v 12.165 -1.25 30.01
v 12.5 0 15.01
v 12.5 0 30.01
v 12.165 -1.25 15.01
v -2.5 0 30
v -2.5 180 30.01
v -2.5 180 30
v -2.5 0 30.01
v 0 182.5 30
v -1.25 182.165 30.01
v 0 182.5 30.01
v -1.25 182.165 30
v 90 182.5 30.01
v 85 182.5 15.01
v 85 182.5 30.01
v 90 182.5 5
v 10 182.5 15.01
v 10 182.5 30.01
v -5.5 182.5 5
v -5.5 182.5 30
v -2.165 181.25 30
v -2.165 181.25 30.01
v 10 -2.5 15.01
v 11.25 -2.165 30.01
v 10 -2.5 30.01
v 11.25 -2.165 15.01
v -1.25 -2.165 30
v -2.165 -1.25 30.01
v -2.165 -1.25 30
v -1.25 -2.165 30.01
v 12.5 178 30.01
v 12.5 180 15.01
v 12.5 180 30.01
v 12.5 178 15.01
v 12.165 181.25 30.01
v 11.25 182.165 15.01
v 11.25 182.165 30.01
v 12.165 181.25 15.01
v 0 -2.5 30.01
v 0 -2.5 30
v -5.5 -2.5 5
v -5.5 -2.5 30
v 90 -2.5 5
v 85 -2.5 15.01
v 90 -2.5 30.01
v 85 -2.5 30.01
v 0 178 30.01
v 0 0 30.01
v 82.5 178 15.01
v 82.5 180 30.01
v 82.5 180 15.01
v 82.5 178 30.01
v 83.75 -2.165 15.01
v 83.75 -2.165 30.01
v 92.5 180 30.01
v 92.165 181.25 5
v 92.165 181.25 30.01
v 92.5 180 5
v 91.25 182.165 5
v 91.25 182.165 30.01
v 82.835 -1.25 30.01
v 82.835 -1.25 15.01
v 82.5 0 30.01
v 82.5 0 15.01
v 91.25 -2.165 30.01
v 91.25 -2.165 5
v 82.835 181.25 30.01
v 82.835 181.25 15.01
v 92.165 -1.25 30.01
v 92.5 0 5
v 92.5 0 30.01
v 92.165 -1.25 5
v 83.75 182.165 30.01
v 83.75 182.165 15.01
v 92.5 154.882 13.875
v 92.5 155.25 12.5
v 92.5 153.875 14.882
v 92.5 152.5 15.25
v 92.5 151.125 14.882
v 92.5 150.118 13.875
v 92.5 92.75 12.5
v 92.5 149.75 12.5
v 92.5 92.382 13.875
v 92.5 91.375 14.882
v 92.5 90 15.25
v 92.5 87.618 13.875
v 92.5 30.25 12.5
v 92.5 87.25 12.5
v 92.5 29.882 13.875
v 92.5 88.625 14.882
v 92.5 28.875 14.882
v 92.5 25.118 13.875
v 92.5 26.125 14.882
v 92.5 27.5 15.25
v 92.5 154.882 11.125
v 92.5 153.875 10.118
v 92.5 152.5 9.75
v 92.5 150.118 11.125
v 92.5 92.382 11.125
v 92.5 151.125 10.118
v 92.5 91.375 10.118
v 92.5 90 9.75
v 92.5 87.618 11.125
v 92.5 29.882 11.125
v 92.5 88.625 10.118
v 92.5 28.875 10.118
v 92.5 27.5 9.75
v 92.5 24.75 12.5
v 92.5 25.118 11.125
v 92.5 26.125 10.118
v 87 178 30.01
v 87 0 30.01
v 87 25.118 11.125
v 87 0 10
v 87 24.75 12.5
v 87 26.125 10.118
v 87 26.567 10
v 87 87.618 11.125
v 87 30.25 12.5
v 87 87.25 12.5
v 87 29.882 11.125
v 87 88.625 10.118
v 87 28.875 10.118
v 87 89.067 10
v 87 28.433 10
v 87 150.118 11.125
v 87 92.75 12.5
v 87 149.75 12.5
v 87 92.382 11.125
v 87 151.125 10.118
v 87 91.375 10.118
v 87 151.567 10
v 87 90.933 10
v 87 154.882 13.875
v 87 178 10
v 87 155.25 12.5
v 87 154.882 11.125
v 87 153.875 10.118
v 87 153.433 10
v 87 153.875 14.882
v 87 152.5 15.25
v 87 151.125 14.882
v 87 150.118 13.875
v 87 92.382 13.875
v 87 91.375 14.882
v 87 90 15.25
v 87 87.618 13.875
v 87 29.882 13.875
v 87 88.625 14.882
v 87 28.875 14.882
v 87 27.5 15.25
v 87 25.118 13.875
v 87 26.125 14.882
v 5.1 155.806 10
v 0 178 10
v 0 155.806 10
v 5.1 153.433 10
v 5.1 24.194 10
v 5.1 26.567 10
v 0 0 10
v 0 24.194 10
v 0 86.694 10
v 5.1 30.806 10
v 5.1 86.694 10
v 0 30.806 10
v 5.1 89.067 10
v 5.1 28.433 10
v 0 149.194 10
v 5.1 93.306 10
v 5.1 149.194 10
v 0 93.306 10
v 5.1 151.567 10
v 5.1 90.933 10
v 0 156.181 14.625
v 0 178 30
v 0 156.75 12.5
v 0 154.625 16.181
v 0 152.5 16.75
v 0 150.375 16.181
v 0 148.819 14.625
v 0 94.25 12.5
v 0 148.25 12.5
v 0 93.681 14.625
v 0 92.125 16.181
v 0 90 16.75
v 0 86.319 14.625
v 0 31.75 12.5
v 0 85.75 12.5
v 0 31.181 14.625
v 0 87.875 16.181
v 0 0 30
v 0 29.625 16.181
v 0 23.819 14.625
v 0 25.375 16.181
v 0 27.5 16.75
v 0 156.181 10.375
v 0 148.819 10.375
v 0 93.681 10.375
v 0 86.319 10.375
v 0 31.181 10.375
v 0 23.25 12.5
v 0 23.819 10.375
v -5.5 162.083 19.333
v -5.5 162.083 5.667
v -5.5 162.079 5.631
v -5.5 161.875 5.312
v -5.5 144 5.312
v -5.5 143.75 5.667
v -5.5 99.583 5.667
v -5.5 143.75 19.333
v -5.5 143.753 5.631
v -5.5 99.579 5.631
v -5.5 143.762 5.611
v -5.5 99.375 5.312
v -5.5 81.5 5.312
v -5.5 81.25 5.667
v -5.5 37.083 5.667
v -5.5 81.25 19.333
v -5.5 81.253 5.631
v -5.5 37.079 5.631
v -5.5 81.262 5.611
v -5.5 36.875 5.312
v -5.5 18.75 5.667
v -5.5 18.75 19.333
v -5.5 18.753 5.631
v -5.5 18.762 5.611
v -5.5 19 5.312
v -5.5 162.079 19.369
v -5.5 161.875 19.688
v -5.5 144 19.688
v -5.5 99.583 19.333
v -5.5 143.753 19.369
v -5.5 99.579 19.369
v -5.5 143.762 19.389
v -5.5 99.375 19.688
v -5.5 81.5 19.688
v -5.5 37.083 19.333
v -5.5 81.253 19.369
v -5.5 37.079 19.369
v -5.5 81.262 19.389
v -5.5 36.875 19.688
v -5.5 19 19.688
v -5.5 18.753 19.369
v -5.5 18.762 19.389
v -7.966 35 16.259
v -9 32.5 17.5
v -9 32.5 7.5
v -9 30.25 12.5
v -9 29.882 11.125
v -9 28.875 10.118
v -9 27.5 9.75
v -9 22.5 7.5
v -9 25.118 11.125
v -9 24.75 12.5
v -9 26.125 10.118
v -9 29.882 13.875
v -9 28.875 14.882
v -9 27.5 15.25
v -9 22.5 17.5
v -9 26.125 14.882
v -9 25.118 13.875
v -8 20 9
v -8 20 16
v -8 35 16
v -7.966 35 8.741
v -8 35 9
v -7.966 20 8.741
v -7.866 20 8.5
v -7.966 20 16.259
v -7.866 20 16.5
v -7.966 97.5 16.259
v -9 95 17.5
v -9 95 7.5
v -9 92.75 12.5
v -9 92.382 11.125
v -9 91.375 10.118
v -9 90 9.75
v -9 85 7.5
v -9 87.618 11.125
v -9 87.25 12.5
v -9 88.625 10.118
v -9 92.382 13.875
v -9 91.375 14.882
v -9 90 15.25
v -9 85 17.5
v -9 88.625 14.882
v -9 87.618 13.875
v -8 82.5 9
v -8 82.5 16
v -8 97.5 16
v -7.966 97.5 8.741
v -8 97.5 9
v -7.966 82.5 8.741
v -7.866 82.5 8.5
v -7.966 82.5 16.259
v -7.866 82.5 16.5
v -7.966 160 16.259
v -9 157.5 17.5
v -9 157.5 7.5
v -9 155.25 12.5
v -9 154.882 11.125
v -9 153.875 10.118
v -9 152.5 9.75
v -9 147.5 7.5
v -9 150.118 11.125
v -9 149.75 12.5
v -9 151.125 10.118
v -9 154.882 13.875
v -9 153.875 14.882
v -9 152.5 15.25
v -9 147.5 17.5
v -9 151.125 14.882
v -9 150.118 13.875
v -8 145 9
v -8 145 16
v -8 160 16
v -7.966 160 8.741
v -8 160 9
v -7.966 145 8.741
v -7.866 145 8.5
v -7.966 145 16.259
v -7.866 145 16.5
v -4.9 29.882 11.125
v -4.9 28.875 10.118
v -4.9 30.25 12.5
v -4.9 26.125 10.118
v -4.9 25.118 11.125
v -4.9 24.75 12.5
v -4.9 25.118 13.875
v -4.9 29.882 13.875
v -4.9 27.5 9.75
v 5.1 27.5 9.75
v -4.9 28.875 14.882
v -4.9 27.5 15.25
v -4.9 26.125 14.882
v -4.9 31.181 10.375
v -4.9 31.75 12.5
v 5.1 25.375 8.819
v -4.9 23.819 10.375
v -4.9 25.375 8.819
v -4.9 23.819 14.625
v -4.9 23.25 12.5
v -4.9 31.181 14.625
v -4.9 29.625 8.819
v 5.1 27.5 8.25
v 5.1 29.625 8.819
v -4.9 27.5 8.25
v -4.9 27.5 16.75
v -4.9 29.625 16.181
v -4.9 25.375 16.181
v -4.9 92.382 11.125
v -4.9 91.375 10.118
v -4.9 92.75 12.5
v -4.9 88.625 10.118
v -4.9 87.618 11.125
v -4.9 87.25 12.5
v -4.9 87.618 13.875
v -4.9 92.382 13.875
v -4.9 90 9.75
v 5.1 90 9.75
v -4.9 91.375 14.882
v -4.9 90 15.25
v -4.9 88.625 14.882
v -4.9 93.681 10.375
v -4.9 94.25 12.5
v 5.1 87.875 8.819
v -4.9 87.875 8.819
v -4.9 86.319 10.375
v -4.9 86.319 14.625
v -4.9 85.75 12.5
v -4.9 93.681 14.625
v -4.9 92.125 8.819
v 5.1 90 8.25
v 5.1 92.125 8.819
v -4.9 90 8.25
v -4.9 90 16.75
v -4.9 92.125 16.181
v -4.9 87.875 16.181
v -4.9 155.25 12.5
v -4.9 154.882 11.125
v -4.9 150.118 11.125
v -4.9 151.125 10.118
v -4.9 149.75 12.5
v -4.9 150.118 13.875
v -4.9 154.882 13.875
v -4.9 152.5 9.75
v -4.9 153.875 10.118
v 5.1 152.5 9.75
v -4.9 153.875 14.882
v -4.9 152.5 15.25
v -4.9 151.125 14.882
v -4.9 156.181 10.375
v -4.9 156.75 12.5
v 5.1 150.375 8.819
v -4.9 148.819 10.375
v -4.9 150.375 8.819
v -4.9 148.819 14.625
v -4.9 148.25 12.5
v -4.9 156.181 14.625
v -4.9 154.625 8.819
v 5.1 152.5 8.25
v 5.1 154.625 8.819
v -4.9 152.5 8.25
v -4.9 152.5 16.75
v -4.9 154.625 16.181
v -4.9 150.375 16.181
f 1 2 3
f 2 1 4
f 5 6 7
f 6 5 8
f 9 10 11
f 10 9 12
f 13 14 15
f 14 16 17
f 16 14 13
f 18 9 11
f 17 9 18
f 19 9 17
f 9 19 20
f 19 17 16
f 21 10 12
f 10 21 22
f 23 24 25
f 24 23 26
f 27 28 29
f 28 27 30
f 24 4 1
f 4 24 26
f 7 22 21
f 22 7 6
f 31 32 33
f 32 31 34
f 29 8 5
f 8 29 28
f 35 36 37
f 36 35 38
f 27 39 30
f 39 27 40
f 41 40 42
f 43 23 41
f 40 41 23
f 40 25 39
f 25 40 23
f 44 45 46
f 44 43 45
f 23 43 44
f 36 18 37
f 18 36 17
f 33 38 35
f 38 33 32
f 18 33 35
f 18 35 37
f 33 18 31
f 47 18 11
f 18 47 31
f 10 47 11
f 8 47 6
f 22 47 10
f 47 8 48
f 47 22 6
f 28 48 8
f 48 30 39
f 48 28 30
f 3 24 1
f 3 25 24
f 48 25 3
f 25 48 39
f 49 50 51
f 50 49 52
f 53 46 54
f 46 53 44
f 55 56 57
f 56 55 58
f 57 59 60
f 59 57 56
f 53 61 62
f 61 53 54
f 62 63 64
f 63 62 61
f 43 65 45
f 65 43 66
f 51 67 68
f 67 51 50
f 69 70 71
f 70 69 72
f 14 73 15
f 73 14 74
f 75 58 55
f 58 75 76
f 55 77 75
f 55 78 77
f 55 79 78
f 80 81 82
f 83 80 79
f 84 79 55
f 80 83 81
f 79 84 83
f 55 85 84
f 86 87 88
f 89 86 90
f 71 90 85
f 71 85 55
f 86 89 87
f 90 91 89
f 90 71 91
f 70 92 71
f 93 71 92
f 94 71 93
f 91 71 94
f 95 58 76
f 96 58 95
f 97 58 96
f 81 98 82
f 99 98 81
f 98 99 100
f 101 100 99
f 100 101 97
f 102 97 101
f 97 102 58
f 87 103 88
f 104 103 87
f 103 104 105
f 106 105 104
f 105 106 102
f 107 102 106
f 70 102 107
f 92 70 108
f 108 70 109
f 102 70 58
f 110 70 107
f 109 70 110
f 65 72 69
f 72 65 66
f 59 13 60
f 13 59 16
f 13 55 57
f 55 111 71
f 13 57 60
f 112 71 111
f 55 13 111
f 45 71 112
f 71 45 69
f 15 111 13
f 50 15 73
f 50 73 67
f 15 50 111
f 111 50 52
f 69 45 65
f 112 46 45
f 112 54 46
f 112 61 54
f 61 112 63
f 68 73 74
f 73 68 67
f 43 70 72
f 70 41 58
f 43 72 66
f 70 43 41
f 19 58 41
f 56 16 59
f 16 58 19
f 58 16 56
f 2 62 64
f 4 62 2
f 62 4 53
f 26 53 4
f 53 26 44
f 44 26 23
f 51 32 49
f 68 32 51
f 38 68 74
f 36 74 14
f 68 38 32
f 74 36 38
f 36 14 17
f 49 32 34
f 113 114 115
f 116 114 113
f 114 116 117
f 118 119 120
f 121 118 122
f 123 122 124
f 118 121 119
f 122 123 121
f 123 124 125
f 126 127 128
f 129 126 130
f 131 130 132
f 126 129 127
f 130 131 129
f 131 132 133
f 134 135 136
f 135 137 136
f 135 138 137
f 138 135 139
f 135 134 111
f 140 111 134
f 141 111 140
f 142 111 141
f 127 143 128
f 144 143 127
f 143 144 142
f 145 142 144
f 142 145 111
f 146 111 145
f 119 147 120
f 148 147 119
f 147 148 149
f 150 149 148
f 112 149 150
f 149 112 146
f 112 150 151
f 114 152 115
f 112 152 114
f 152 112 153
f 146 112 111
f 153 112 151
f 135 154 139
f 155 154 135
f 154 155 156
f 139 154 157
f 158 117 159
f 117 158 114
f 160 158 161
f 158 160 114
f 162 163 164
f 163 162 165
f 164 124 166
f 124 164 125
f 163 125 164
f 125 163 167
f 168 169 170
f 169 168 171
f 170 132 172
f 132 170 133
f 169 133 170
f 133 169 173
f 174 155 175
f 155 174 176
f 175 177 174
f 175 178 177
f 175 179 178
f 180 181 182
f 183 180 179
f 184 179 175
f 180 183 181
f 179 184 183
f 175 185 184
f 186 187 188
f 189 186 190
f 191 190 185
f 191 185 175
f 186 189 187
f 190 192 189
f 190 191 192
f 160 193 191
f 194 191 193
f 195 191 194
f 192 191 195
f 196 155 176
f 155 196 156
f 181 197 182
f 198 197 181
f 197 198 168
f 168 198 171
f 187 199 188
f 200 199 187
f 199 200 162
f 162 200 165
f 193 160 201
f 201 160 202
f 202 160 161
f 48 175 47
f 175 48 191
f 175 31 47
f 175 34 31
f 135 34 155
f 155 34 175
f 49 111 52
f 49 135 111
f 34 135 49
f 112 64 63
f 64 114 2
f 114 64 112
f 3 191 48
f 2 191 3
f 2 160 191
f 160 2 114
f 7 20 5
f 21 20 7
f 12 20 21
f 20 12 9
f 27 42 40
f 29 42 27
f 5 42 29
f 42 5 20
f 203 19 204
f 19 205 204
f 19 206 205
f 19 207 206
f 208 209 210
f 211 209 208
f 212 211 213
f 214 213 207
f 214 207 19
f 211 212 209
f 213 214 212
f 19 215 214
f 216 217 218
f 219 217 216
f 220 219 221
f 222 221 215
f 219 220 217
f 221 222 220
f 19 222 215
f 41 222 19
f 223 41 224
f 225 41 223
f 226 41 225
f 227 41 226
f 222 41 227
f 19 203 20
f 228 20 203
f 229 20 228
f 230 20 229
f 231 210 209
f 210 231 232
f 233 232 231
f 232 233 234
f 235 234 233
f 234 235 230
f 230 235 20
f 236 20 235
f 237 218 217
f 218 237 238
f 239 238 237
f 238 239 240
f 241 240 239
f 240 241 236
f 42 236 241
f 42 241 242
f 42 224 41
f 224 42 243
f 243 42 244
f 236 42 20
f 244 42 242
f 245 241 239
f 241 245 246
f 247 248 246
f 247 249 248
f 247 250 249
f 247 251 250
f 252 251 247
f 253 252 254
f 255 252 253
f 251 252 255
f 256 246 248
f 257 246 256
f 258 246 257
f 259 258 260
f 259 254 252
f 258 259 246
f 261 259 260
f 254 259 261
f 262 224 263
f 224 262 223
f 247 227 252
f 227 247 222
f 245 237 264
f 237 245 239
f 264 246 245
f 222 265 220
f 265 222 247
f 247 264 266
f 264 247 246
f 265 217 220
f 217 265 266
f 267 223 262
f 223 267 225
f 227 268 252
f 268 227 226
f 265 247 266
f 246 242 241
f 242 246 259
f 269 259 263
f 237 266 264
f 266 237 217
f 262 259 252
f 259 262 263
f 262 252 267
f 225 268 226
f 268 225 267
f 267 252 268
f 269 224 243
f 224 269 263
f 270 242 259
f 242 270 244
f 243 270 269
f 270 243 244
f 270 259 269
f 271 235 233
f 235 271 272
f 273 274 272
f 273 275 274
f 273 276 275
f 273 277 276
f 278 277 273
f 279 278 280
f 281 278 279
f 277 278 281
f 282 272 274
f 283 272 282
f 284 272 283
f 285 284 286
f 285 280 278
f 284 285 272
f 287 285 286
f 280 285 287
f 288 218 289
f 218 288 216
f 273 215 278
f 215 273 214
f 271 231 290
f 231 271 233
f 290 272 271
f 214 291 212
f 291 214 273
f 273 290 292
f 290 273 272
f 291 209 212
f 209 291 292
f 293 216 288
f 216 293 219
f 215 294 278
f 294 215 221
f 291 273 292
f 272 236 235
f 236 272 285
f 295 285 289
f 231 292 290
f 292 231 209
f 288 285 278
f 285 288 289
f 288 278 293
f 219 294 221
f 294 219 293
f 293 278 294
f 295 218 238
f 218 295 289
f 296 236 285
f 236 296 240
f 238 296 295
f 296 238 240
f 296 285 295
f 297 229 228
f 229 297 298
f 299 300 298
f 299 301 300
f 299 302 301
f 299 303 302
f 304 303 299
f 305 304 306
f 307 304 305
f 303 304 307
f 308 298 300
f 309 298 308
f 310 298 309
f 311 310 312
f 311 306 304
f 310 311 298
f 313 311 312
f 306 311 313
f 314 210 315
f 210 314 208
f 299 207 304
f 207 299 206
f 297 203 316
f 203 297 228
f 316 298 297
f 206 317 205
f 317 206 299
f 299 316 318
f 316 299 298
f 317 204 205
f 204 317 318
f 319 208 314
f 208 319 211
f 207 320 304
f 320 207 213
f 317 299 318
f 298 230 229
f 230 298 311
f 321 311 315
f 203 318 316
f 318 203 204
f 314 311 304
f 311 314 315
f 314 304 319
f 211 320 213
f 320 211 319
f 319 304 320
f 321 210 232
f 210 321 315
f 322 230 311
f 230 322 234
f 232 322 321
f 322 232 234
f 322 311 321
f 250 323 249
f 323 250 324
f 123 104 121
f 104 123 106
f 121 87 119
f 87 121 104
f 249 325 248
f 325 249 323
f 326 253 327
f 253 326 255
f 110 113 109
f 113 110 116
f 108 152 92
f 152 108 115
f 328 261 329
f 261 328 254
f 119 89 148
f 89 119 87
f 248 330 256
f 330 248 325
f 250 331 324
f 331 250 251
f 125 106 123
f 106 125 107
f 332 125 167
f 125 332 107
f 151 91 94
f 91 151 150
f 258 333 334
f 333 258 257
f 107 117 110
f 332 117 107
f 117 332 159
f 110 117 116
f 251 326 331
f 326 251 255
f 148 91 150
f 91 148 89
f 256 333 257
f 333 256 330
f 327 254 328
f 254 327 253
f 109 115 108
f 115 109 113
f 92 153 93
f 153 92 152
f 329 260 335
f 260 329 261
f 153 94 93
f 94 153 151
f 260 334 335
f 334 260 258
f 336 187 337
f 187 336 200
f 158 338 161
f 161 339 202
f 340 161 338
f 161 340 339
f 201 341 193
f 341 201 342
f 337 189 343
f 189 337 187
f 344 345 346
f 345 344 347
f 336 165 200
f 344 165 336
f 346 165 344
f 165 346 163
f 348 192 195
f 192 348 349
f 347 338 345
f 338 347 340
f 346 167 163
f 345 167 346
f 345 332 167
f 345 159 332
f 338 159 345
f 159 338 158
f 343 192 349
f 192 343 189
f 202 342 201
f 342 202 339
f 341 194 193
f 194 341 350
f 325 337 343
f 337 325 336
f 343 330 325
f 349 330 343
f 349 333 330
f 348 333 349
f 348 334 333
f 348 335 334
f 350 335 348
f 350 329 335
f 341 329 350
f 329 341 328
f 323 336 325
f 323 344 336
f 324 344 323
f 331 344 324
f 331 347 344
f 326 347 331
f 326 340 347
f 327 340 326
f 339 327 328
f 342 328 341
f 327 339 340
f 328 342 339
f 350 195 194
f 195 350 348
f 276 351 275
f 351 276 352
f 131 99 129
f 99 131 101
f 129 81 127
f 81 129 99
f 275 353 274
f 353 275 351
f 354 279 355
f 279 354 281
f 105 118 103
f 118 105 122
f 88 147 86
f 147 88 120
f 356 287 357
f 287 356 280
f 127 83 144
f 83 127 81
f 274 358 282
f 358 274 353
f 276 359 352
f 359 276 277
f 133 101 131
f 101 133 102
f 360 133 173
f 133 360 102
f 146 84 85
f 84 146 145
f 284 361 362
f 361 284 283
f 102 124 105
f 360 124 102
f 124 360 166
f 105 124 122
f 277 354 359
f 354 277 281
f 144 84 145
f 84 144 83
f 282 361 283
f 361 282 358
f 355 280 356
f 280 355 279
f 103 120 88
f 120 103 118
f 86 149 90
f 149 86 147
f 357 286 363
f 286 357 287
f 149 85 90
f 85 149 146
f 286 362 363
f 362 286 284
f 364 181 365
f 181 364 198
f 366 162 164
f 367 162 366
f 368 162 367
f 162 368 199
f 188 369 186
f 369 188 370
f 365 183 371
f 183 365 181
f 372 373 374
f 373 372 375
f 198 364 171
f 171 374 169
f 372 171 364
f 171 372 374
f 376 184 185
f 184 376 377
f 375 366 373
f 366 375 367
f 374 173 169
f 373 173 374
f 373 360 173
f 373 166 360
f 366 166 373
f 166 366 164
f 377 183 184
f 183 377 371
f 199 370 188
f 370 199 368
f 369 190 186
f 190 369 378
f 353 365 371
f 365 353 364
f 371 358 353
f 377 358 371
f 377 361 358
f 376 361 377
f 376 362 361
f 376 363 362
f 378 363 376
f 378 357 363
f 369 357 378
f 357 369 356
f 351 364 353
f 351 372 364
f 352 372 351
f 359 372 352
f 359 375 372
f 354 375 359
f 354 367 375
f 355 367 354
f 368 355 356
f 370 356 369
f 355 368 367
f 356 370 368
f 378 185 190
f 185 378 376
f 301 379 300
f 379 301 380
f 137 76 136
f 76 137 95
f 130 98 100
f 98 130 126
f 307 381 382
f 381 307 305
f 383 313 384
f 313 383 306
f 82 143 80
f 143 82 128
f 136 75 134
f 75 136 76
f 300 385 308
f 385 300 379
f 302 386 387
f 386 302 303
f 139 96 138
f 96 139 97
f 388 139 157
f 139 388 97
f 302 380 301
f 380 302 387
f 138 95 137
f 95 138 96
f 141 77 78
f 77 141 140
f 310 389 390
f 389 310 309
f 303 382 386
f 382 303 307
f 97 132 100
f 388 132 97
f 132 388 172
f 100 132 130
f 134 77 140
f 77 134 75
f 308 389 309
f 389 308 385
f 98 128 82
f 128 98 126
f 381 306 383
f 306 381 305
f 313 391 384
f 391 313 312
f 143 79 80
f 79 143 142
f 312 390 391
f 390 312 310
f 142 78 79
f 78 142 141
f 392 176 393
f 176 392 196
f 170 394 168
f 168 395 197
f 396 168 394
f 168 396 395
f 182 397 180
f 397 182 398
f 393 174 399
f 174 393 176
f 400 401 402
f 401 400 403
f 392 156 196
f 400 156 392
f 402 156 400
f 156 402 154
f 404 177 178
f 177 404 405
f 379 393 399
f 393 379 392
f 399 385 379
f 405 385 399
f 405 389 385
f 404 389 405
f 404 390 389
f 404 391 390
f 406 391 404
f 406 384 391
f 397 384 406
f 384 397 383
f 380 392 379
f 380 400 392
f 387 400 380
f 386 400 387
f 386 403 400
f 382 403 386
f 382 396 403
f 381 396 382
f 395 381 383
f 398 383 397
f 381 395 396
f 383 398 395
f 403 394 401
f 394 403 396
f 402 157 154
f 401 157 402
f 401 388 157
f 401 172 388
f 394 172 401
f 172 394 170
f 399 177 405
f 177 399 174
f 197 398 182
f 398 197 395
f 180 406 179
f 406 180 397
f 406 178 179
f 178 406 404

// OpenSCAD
/*
	3D Power Supply Mount
	by Free Beachler of Terawatt Industries

This work is licensed under the Creative Commons Attribution-ShareAlike 3.0 Unported License. To view a copy of this license, visit http://creativecommons.org/licenses/by-sa/3.0/.
*/

//Round corner diameter
round_corner_diameter = 8;

m5_diameter = 5.5;
m5_nut_diameter = 9.5;
m5_cap_diameter = 8.5;
m4_diameter = 4.5;
m4_nut_diameter = 7.5;
m3_diameter = 3.2;
m3_nut_diameter = 5.3;

power_mount();
// power supply
//% color([0.1, 0.9, 0]) translate([0, 2.5, 10]) cube([85, 175, 70]);

module power_mount() {
	difference() {
		union() {
			platform();
			translate([0, 25 + 5 + 2.5, 17]) rotate([0, 0, 90]) mount_arm_m3(0, 0, 0, 0.1, 2);
			translate([0, 87.5 + 5 + 2.5, 17]) rotate([0, 0, 90]) mount_arm_m3(0, 0, 0, 0.1, 2);
			translate([0, 150 + 5 + 2.5, 17]) rotate([0, 0, 90]) mount_arm_m3(0, 0, 0, 0.1, 2);
		}
		translate([0, 2.5, 2.5]) mount_holes();
	}
}

module platform() {
	difference() {
		// round some corners
		translate([0, 0, 5]) minkowski() {
			difference() {
				cube([90, 180, 25]);
				translate([10, -5.1, 10]) cube([75, 205.2, 70]);
			}
			cylinder(r=2.5, h=0.01, center=false, $fn=12);
			//	rotate([0, 90, 0]) cylinder(r=2.5, h=0.01, center=false, $fn=12);
		}
		translate([0, 0, 10]) cube([87, 178, 75]);
	}
	// square the mount plate area
	translate([-5.5, -2.5, 5]) cube([5.5, 185, 25]);
	//	translate([-9.5, 5, 0]) cube([97.5, 185, 5]);
}

module mount_holes() {
	for (i = [25, 87.5, 150]) {
		rotate([0, 90, 0]) translate([-10, i, -20]) cylinder(r=m5_diameter / 2, h=150, center = false, $fn=12);
		rotate([0, 90, 0]) translate([-10, i, -4.9]) cylinder(r=m5_cap_diameter / 2, h=10, center = false, $fn=12);
	}
}


module mount_arm_m3(h, w, d, tol, wt) {
	for (z = [d - wt - 5 + 3.5]) {
		// trapezoid block
		difference() { 
			hull() {
				hull() {
					translate([h - 10, w + 4, z - 6]) cube([10, 5, 10], center = false);
					translate([h + 5, w, z + 6.5]) rotate([0, 90, 90]) cube([15, 15 + wt * 2, 5], center = false);
				}
				// rounded block
				translate([h - 12.5, w + wt + 1.5 + 3.5, z + 2.5]) rotate([90, 0, 90]) cylinder(r = 1, h = 15, center = false, $fn = 24);
				translate([h - 12.5, w + wt + 1.5 + 3.5, z - 7 + 2.5]) rotate([90, 0, 90]) cylinder(r = 1, h = 15, center = false, $fn = 24);
			}
			// M3 mount hole
			translate([h - 5, w * 2, z - 3.5 + 2.5]) rotate([90, 0, 0]) cylinder(r = 1.6, h = d * 2, center = false, $fn = 24);
		}
	}
}
